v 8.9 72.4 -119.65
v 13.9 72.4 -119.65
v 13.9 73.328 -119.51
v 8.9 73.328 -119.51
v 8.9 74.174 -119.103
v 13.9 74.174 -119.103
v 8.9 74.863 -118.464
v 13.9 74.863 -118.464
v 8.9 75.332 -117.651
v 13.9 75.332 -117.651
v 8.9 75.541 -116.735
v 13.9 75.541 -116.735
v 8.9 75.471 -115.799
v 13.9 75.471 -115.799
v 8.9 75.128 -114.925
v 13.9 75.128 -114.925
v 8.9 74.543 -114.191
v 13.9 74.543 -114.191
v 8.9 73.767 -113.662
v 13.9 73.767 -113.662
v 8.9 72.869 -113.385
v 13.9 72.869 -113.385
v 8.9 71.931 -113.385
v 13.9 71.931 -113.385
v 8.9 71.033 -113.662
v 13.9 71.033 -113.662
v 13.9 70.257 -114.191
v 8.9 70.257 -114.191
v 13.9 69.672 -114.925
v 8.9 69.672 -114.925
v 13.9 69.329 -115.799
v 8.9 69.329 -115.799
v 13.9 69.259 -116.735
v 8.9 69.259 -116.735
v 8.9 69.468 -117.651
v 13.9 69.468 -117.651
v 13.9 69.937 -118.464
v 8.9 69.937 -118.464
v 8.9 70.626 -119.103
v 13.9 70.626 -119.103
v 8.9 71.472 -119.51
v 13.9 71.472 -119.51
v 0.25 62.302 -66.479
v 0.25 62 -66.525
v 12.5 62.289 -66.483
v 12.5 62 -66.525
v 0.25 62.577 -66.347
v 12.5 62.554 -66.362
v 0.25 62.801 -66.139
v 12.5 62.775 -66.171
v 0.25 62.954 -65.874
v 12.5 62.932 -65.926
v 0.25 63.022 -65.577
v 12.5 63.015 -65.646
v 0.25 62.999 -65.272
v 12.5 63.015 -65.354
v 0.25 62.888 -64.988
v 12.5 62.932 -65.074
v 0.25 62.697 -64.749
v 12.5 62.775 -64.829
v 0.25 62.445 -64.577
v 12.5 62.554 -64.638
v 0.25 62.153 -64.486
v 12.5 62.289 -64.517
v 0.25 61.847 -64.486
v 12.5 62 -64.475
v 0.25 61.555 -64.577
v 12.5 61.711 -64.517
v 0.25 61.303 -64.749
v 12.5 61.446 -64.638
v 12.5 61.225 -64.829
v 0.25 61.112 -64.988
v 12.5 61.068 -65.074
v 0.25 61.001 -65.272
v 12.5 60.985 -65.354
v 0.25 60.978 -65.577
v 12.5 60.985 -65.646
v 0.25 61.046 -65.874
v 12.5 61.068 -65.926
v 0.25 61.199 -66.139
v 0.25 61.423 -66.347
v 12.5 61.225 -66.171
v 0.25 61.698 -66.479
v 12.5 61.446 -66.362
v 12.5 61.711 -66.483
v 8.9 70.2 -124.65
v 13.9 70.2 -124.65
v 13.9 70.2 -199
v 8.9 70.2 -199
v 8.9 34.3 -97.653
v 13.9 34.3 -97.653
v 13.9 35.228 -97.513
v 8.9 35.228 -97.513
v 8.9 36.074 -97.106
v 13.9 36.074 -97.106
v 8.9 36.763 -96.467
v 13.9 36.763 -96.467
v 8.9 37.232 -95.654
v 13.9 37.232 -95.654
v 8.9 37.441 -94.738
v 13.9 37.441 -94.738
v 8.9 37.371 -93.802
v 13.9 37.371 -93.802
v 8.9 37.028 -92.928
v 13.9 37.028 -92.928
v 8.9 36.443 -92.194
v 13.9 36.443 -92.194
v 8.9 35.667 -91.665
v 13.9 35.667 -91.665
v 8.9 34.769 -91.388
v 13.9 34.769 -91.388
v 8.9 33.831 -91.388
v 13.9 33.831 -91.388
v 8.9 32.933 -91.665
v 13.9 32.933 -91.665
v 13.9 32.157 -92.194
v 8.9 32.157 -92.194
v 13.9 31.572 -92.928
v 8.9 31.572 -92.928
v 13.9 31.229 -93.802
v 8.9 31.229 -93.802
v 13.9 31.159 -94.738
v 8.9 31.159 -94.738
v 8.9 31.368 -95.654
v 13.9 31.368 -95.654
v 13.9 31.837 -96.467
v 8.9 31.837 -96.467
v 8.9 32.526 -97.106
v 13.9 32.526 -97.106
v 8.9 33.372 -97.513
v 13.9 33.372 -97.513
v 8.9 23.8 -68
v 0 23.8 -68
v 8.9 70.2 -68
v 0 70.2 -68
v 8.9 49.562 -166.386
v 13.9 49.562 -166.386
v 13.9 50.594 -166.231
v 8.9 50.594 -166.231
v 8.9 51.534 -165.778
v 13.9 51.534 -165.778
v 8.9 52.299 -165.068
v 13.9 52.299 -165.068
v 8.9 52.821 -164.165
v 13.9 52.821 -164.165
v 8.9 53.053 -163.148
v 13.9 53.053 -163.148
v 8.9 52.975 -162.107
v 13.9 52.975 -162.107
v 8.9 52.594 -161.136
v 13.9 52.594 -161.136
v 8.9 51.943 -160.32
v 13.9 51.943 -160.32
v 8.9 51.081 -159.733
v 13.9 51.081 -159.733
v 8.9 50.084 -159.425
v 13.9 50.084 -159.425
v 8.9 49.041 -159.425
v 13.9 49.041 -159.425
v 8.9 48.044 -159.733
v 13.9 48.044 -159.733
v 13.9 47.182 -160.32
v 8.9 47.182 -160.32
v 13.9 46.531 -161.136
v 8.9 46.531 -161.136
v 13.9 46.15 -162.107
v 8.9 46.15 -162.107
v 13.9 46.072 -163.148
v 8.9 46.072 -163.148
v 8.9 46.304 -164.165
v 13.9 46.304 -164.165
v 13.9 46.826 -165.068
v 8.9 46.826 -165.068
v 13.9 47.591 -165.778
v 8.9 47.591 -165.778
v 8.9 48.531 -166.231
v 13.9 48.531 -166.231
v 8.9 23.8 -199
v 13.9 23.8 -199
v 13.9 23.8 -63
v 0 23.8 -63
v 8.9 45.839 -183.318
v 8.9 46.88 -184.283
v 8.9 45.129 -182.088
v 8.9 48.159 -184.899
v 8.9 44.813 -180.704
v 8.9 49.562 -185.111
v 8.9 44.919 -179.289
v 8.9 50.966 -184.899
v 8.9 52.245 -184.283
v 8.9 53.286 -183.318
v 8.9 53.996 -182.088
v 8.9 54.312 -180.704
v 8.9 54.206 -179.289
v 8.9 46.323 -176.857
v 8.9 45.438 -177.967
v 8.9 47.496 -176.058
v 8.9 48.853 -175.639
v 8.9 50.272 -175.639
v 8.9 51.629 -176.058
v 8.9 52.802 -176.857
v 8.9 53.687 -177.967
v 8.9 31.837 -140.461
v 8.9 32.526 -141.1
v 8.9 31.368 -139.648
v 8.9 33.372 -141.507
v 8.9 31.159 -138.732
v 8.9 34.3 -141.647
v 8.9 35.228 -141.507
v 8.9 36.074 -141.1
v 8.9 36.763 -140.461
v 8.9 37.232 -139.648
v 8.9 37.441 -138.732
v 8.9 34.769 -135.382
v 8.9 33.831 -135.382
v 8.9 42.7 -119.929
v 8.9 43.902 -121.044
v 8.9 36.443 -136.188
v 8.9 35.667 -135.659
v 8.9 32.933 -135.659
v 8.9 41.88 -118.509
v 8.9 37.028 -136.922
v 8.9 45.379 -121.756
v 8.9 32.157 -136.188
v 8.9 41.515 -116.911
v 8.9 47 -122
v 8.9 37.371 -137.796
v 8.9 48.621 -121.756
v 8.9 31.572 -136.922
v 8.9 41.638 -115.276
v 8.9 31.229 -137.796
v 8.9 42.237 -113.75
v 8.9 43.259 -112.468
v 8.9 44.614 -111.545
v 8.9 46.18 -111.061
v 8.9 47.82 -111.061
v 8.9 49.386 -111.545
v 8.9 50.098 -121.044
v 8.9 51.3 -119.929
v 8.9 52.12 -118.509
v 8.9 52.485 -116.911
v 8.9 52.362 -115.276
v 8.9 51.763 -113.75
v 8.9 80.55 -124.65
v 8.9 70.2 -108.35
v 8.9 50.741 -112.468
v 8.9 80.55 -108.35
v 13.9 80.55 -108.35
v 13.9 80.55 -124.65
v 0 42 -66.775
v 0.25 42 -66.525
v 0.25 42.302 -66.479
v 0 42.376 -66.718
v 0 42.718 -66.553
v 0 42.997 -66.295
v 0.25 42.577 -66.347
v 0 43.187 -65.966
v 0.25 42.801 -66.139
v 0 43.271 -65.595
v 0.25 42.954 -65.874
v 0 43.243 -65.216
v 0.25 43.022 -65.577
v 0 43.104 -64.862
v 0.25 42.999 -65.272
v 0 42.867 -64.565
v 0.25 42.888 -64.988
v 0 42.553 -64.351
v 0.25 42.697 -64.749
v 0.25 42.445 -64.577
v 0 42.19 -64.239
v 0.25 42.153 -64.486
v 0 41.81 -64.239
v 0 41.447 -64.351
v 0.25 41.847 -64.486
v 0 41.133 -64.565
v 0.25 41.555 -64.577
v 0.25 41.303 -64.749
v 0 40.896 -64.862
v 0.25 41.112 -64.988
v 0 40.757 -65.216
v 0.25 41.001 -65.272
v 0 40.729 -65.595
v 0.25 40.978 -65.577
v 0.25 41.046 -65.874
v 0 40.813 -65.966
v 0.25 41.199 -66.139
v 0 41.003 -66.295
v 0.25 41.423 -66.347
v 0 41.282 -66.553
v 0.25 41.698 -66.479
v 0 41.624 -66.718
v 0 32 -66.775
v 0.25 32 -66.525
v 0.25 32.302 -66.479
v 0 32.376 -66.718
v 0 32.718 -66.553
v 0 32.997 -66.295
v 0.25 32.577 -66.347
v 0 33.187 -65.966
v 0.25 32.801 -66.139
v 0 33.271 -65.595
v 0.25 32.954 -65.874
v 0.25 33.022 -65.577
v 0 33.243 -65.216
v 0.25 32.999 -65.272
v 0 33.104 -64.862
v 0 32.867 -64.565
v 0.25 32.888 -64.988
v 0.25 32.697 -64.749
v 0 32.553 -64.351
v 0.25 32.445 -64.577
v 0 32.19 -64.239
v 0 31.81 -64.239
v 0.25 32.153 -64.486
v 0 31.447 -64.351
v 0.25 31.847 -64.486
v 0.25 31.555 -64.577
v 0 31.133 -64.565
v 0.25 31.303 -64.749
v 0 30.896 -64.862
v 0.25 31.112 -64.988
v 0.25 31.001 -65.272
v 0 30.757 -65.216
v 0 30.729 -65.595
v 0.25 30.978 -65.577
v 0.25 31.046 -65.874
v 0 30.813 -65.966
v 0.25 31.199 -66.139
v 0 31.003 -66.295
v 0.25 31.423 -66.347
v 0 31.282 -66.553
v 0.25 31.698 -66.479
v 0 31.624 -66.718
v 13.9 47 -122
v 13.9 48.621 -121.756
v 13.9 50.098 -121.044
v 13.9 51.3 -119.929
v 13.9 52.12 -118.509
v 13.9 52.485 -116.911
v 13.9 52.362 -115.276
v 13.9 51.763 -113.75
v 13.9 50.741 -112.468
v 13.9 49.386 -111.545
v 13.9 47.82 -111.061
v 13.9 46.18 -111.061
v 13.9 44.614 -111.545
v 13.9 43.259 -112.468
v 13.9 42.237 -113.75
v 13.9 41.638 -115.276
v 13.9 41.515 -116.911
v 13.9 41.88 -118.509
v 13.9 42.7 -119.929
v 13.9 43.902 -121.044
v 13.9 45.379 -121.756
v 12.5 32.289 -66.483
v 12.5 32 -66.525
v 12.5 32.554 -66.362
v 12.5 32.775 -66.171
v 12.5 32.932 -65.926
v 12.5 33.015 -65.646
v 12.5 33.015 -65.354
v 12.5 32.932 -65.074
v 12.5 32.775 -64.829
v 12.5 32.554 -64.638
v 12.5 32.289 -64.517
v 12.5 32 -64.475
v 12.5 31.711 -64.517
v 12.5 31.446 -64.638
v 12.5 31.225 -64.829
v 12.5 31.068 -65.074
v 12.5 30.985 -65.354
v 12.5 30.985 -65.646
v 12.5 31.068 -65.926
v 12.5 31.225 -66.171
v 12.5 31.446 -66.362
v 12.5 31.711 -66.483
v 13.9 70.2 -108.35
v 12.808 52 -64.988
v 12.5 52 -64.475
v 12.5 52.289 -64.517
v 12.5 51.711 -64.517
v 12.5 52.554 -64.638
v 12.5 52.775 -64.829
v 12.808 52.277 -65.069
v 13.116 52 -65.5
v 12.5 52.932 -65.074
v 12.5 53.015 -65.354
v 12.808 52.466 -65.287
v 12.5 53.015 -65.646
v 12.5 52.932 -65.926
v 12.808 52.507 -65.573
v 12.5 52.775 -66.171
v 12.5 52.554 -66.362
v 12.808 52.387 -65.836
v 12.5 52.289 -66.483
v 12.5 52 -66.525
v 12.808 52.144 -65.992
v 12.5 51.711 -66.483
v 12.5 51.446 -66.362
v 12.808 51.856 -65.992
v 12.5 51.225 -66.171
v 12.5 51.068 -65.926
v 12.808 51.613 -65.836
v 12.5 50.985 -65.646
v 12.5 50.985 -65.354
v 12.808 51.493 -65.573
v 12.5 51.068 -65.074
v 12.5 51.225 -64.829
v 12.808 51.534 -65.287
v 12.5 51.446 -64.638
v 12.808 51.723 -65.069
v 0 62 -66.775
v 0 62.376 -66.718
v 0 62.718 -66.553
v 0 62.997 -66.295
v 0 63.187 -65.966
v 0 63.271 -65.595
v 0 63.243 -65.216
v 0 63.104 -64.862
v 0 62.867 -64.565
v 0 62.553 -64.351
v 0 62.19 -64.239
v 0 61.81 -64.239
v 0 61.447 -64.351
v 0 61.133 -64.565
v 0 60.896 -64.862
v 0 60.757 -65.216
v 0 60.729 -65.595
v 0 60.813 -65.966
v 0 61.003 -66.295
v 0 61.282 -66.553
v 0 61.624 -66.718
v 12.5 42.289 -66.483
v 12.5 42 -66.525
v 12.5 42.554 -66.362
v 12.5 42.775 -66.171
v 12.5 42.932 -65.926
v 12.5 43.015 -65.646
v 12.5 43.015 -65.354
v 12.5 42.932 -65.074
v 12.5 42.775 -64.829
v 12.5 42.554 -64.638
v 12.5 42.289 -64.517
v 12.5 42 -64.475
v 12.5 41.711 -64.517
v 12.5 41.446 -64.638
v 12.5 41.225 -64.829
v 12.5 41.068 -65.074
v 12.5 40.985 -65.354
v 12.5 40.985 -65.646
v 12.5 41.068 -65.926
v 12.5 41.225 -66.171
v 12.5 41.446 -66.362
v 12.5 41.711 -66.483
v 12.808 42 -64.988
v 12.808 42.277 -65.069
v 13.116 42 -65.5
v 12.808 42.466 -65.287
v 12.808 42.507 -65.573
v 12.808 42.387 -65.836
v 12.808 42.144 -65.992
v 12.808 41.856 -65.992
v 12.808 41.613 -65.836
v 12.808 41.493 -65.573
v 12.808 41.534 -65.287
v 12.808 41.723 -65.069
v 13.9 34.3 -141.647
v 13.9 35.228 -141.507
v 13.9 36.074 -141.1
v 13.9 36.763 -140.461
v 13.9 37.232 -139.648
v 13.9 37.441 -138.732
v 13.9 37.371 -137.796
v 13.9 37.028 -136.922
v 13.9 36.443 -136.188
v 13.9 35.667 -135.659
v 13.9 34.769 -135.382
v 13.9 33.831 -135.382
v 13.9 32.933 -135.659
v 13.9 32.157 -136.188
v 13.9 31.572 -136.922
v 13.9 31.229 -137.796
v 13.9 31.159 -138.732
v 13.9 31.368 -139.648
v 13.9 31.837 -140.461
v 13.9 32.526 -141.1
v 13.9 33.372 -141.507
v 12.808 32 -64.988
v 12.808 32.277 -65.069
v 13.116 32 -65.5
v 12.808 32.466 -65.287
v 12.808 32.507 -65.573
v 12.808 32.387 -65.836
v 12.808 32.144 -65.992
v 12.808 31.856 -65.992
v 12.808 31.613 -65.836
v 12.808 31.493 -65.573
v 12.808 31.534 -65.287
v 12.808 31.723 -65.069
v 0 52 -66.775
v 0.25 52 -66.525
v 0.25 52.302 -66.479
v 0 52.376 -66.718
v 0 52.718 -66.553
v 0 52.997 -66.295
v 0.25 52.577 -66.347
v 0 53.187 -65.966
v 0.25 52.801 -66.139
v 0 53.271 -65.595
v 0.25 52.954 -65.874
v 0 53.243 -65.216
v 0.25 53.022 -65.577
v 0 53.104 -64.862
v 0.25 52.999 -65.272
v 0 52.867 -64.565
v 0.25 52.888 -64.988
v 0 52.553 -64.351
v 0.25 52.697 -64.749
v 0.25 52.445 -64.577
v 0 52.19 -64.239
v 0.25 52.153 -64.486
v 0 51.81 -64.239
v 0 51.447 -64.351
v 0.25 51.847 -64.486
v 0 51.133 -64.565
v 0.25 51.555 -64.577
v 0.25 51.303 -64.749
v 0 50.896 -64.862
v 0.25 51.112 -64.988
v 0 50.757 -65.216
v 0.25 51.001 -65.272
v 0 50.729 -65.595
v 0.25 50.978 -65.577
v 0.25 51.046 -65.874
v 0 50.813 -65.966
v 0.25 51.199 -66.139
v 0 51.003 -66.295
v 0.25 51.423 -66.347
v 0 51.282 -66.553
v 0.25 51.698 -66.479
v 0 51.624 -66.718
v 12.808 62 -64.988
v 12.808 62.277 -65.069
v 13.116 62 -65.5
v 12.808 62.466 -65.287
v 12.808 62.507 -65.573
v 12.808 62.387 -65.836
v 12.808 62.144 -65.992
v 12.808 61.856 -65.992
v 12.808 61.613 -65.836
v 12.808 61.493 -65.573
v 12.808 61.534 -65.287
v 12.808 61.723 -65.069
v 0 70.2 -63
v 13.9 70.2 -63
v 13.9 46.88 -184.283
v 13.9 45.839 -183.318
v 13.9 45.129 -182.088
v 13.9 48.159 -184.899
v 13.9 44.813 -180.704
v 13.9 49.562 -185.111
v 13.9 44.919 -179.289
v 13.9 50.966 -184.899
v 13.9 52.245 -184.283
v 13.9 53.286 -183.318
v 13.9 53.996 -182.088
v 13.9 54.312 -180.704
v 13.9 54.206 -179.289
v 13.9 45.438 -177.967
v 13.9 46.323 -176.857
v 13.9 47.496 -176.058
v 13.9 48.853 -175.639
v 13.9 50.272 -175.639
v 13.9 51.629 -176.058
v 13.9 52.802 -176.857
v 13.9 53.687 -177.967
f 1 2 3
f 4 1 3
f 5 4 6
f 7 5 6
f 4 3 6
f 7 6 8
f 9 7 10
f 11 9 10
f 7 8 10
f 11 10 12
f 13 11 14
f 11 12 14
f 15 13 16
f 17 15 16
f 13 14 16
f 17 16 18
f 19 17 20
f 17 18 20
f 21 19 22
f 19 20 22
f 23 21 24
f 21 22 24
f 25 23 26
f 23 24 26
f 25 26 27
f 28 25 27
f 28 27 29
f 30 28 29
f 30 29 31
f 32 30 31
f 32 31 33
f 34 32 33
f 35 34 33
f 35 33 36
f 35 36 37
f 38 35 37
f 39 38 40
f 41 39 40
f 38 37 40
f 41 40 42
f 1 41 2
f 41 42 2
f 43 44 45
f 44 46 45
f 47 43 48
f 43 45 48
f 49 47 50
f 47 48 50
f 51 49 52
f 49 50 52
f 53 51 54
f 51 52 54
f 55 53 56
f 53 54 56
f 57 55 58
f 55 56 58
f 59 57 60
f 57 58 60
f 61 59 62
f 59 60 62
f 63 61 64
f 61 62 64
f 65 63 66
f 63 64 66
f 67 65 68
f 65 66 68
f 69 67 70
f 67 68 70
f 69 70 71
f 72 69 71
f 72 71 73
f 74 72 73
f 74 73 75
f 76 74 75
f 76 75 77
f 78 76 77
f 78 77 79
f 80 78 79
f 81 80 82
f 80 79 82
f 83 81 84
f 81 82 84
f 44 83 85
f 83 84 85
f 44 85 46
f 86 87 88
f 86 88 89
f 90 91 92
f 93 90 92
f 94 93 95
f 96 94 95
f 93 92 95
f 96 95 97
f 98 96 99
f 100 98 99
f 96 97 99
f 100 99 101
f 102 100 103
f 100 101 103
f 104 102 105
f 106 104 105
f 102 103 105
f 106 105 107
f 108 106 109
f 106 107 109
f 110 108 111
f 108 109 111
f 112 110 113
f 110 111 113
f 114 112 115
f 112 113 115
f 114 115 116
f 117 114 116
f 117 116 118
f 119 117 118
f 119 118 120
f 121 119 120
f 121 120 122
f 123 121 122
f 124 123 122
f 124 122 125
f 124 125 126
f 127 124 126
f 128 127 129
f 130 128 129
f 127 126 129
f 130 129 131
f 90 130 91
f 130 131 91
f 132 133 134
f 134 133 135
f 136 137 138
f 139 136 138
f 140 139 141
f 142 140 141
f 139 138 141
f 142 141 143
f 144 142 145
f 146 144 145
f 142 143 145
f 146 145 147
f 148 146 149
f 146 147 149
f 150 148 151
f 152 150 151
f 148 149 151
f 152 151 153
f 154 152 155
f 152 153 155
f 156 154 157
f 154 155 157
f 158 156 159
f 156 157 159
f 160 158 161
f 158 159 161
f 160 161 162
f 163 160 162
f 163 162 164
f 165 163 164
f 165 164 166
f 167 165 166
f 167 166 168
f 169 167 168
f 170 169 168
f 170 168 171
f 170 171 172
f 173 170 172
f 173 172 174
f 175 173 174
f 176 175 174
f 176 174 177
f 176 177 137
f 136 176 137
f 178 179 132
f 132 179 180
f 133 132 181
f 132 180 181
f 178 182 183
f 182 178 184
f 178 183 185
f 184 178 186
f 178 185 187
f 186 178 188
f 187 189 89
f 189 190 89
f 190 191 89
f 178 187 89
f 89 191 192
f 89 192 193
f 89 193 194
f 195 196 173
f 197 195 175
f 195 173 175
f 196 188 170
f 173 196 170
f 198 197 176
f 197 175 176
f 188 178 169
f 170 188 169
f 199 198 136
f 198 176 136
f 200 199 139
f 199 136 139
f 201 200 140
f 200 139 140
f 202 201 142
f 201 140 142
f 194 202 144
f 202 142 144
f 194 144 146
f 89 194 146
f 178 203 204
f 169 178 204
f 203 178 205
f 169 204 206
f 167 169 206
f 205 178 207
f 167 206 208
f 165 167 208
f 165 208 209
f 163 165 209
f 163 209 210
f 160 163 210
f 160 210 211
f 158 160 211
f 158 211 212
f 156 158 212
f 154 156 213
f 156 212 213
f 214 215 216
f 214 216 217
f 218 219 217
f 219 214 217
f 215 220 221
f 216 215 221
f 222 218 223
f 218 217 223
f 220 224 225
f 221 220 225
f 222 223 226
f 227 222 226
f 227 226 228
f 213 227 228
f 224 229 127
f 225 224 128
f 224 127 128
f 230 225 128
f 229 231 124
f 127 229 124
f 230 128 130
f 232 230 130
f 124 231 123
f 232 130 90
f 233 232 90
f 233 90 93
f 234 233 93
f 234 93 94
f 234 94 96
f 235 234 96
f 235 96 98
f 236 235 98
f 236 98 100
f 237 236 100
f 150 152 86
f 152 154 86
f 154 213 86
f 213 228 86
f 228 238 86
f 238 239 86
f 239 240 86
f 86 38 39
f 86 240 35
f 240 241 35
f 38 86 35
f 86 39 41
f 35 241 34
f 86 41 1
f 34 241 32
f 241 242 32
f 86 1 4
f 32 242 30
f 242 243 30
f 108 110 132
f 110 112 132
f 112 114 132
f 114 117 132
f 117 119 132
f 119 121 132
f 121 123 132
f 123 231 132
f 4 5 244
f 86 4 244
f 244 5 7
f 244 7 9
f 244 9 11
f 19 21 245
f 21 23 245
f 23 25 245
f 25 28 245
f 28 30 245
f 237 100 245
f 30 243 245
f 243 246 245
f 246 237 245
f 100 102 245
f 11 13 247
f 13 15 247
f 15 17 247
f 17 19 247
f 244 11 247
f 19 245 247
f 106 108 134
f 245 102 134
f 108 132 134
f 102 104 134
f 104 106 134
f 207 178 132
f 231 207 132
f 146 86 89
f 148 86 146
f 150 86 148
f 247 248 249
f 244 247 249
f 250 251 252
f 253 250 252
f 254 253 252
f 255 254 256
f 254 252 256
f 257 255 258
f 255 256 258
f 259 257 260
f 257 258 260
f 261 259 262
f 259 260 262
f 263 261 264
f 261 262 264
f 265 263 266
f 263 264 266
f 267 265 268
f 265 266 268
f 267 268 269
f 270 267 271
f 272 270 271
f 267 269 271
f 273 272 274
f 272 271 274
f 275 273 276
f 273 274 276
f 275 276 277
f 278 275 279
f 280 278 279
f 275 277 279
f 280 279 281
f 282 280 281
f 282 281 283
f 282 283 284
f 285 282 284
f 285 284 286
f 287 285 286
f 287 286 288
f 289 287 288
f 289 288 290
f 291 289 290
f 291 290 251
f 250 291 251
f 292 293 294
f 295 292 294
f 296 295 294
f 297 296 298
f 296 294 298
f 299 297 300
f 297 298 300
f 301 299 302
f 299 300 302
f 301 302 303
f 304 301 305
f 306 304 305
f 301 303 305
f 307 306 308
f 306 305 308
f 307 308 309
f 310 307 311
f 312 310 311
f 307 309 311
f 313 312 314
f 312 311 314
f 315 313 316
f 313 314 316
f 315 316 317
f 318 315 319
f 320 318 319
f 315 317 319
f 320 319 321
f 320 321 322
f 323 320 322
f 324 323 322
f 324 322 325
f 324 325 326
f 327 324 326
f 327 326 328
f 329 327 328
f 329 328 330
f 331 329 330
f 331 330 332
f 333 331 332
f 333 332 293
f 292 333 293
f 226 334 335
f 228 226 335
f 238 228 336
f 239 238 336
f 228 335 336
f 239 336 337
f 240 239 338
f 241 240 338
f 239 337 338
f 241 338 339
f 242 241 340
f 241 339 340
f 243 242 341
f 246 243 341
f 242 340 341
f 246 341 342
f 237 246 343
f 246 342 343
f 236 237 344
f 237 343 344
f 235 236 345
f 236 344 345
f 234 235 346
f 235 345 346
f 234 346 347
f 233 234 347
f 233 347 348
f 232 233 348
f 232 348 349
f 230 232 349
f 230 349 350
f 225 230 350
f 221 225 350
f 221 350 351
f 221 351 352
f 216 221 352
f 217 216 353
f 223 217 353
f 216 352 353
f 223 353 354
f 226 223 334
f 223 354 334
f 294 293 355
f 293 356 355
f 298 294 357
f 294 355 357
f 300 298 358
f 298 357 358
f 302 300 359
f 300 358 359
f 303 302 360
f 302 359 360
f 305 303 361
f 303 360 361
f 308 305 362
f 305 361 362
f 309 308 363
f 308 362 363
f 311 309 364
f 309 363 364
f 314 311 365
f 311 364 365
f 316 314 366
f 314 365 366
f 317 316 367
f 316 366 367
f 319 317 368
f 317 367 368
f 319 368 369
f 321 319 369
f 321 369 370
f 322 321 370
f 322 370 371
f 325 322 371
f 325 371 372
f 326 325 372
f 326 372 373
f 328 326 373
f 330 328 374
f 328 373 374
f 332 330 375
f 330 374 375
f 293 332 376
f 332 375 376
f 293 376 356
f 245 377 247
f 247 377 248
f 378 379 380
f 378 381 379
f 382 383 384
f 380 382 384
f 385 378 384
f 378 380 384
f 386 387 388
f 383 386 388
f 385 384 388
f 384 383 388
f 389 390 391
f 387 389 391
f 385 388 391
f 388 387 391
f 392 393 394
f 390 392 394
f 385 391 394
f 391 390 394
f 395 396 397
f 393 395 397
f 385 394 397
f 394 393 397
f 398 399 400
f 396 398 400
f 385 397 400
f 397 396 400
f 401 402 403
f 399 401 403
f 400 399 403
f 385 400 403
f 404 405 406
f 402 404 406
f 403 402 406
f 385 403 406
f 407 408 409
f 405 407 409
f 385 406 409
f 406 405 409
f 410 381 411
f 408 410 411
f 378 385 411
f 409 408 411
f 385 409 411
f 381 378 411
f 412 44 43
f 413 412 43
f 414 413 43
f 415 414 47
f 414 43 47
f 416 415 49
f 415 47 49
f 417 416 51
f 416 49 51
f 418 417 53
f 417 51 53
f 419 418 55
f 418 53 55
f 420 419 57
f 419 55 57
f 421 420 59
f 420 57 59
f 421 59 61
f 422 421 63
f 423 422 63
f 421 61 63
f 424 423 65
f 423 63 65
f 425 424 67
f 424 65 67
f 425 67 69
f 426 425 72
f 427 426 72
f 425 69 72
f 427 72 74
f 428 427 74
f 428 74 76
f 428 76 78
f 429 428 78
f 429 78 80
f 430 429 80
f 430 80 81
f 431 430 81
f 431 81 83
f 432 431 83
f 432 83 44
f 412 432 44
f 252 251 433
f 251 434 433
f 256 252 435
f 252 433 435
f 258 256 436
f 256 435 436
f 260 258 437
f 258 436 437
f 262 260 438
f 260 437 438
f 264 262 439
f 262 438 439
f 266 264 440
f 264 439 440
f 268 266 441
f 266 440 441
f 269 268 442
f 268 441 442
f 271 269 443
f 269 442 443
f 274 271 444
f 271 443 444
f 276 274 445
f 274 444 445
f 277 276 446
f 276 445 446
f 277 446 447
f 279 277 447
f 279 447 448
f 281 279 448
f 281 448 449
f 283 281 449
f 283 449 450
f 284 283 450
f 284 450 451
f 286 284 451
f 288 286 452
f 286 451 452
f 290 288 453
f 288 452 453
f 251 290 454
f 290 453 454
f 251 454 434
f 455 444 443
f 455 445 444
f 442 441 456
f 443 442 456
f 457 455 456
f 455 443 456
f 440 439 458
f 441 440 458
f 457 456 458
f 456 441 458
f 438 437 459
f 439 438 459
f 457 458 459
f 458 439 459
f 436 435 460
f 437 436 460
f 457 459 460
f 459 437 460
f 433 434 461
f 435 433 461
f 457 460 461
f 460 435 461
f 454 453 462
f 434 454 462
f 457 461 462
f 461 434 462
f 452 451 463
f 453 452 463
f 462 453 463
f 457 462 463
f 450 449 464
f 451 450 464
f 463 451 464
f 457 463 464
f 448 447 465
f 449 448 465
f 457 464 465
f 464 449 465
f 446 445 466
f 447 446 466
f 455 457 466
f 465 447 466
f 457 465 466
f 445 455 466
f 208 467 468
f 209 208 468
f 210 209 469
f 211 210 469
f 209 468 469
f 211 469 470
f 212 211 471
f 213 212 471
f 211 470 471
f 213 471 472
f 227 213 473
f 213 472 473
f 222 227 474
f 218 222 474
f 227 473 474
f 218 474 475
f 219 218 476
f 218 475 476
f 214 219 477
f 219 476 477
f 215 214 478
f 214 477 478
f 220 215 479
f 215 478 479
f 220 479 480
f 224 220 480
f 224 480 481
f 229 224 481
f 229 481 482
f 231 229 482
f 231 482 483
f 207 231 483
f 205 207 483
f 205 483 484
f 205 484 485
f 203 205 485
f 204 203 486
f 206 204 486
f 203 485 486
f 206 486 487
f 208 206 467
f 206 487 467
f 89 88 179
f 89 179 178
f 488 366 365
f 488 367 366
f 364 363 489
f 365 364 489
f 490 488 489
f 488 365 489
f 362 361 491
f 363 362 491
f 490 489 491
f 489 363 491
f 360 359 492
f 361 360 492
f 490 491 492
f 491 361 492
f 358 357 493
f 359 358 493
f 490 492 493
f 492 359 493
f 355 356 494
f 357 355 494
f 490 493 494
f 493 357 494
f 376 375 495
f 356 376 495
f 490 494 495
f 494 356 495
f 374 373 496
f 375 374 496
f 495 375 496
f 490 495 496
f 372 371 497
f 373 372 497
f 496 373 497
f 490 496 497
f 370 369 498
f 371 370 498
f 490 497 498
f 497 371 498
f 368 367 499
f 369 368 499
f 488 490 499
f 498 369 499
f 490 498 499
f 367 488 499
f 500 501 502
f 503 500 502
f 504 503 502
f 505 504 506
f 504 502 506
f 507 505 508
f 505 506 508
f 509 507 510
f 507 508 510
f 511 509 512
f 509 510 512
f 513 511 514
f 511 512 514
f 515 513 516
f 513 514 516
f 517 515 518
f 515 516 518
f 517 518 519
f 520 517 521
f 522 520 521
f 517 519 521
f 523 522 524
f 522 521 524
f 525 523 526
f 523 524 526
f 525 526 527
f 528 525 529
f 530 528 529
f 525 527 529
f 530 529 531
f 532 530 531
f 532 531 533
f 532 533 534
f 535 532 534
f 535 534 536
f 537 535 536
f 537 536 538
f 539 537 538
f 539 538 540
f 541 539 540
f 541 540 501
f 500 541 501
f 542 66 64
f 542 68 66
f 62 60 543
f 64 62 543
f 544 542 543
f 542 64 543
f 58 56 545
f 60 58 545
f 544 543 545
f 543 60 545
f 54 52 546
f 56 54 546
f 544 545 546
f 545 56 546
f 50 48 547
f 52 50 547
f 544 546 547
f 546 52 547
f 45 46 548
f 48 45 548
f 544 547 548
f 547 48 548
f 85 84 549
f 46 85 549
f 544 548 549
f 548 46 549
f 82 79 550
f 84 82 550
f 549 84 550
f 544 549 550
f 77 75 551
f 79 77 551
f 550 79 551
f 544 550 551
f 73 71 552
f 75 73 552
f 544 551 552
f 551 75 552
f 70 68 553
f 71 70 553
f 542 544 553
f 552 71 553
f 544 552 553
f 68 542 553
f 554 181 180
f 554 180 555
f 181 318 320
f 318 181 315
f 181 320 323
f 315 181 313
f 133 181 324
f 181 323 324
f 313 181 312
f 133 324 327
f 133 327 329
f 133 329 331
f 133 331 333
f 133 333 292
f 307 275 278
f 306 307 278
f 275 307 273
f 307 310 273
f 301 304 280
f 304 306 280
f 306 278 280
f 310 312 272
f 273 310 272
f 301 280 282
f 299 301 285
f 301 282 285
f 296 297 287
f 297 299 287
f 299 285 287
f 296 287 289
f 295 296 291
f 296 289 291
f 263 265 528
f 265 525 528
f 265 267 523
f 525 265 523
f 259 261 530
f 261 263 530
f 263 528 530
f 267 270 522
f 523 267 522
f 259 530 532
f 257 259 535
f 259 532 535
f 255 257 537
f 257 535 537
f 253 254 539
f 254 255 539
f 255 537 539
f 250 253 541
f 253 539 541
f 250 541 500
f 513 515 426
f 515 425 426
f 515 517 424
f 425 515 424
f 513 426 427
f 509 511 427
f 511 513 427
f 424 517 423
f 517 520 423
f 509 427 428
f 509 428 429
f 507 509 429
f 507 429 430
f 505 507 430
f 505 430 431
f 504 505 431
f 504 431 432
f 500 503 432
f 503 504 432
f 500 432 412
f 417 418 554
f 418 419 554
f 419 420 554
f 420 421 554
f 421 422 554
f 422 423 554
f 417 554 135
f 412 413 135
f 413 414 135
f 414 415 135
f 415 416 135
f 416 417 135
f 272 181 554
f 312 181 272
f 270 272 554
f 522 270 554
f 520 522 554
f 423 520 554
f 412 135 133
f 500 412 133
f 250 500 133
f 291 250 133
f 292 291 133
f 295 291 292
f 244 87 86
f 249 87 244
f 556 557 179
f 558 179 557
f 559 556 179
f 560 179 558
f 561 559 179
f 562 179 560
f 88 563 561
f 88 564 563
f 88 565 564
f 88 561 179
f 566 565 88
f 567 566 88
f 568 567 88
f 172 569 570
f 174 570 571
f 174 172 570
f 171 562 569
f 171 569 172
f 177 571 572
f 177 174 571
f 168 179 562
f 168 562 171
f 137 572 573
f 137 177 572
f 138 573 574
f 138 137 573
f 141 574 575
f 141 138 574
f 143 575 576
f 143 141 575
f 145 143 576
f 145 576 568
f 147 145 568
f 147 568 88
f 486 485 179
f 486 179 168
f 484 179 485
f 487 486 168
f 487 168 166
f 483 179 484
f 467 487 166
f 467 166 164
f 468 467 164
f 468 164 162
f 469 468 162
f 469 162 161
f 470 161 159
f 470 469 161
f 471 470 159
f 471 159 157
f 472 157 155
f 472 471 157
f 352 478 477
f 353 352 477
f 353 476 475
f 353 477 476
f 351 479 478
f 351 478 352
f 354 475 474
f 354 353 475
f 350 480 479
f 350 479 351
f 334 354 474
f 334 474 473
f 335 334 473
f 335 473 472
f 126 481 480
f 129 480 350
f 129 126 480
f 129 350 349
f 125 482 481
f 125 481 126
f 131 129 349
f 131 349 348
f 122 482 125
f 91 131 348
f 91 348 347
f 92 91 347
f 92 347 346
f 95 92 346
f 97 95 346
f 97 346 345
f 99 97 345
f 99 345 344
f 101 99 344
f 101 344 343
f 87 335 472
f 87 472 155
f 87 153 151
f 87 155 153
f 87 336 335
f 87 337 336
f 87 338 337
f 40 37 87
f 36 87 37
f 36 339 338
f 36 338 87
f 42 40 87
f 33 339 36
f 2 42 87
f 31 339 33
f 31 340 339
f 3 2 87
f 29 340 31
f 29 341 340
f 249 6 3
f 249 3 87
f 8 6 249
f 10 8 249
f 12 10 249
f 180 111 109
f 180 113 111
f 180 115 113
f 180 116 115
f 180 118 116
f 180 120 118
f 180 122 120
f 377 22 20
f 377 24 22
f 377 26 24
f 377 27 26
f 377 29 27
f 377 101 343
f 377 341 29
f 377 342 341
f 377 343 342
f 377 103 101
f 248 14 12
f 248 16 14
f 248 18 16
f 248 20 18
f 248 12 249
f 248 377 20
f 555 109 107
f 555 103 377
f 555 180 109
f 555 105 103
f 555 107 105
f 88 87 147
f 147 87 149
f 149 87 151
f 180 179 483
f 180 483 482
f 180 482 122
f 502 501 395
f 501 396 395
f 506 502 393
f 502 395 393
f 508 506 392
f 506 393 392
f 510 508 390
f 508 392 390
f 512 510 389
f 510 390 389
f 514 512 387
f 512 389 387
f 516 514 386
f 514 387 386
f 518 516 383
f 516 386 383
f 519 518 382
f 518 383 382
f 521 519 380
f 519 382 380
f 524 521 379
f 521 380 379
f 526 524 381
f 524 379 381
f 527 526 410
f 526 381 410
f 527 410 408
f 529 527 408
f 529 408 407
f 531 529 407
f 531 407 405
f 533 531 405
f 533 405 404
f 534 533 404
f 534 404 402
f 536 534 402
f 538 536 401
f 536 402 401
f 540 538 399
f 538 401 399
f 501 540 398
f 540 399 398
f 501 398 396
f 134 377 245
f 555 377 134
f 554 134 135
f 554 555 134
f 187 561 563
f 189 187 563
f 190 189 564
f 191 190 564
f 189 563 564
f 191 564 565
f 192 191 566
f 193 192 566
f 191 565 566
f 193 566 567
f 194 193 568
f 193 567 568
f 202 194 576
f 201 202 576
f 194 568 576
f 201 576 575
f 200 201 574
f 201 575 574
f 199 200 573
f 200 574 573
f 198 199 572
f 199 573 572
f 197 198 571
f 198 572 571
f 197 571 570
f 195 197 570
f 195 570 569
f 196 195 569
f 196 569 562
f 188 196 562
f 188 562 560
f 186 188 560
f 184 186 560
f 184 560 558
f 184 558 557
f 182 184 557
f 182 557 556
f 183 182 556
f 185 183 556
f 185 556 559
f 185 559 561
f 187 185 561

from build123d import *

# Parameters (mm, degrees)
SKETCH8_W                          = 5
SKETCH8_H                          = 46.4
BOSS_EXTRUDE6_DEPTH                = 13.9
SKETCH9_W                          = 5
SKETCH9_H                          = 46.4
BOSS_EXTRUDE7_DEPTH                = 131
SKETCH11_W                         = 16.3
SKETCH11_H                         = 10.35
BOSS_EXTRUDE8_DEPTH                = 5
SKETCH10_R                         = 5.5
SKETCH10_R_2                       = 3.15
CUT_EXTRUDE2_DEPTH                 = 5
SKETCH16_R                         = 4.7625
CUT_EXTRUDE6_DEPTH                 = 9
SKETCH17_R                         = 3.5
CUT_EXTRUDE7_DEPTH                 = 9
M2_5X0_45_TAPPED_HOLE1_D           = 2.05
M2_5X0_45_TAPPED_HOLE1_DEPTH       = 12.5
M2_5X0_45_TAPPED_HOLE1_CSINK_D     = 2.55
M2_5X0_45_TAPPED_HOLE1_CSINK_ANGLE = 90
M2_5X0_45_TAPPED_HOLE1_TIP         = 0.615882135


with BuildPart() as part:
    # Sketch8 → Boss-Extrude6 (new body)
    with BuildSketch(Plane(origin=(0, 0, 0), x_dir=(0, 0, -1), z_dir=(1, 0, 0))):
        with Locations((65.5, 47)):
            Rectangle(SKETCH8_W, SKETCH8_H)
    extrude(amount=BOSS_EXTRUDE6_DEPTH)

    # Sketch9 → Boss-Extrude7 (add)
    with BuildSketch(Plane(origin=(0, 0, -68), x_dir=(-1, 0, 0), z_dir=(0, 0, -1))):
        with Locations((-11.4, 47)):
            Rectangle(SKETCH9_W, SKETCH9_H)
    extrude(amount=BOSS_EXTRUDE7_DEPTH)

    # Sketch11 → Boss-Extrude8 (add)
    with BuildSketch(Plane(origin=(13.9, 0, 0), x_dir=(0, 0, -1), z_dir=(1, 0, 0))):
        with Locations((116.5, 75.375)):
            Rectangle(SKETCH11_W, SKETCH11_H)
    extrude(amount=-BOSS_EXTRUDE8_DEPTH)

    # Sketch10 → Cut-Extrude2 (cut)
    with BuildSketch(Plane(origin=(13.9, 0, 0), x_dir=(0, 0, -1), z_dir=(1, 0, 0))):
        with Locations((116.5, 47)):
            Circle(SKETCH10_R)
        with Locations((116.5, 72.4)):
            Circle(SKETCH10_R_2)
        with Locations((138.497045256, 34.3)):
            Circle(SKETCH10_R_2)
        with Locations((94.502954744, 34.3)):
            Circle(SKETCH10_R_2)
    extrude(amount=-CUT_EXTRUDE2_DEPTH, mode=Mode.SUBTRACT)

    # Sketch16 → Cut-Extrude6 (cut)
    with BuildSketch(Plane(origin=(13.9, 0, 0), x_dir=(0, 0, -1), z_dir=(1, 0, 0))):
        with Locations((180.348526442, 49.5625)):
            Circle(SKETCH16_R)
    extrude(amount=-CUT_EXTRUDE6_DEPTH, mode=Mode.SUBTRACT)

    # Sketch17 → Cut-Extrude7 (cut)
    with BuildSketch(Plane(origin=(13.9, 0, 0), x_dir=(0, 0, -1), z_dir=(1, 0, 0))):
        with Locations((162.886026442, 49.5625)):
            Circle(SKETCH17_R)
    extrude(amount=-CUT_EXTRUDE7_DEPTH, mode=Mode.SUBTRACT)

    # M2.5x0.45 Tapped Hole1
    with Locations(Plane.ZY):
        with Locations((-65.5, 62), (-65.5, 52), (-65.5, 32), (-65.5, 42)):
            CounterSinkHole(M2_5X0_45_TAPPED_HOLE1_D / 2, M2_5X0_45_TAPPED_HOLE1_CSINK_D / 2, depth=M2_5X0_45_TAPPED_HOLE1_DEPTH, counter_sink_angle=M2_5X0_45_TAPPED_HOLE1_CSINK_ANGLE)
            with Locations((0, 0, -(M2_5X0_45_TAPPED_HOLE1_DEPTH + M2_5X0_45_TAPPED_HOLE1_TIP / 2))):  # 118° drill point
                Cone(0, M2_5X0_45_TAPPED_HOLE1_D / 2, M2_5X0_45_TAPPED_HOLE1_TIP, mode=Mode.SUBTRACT)


solid = part.part
